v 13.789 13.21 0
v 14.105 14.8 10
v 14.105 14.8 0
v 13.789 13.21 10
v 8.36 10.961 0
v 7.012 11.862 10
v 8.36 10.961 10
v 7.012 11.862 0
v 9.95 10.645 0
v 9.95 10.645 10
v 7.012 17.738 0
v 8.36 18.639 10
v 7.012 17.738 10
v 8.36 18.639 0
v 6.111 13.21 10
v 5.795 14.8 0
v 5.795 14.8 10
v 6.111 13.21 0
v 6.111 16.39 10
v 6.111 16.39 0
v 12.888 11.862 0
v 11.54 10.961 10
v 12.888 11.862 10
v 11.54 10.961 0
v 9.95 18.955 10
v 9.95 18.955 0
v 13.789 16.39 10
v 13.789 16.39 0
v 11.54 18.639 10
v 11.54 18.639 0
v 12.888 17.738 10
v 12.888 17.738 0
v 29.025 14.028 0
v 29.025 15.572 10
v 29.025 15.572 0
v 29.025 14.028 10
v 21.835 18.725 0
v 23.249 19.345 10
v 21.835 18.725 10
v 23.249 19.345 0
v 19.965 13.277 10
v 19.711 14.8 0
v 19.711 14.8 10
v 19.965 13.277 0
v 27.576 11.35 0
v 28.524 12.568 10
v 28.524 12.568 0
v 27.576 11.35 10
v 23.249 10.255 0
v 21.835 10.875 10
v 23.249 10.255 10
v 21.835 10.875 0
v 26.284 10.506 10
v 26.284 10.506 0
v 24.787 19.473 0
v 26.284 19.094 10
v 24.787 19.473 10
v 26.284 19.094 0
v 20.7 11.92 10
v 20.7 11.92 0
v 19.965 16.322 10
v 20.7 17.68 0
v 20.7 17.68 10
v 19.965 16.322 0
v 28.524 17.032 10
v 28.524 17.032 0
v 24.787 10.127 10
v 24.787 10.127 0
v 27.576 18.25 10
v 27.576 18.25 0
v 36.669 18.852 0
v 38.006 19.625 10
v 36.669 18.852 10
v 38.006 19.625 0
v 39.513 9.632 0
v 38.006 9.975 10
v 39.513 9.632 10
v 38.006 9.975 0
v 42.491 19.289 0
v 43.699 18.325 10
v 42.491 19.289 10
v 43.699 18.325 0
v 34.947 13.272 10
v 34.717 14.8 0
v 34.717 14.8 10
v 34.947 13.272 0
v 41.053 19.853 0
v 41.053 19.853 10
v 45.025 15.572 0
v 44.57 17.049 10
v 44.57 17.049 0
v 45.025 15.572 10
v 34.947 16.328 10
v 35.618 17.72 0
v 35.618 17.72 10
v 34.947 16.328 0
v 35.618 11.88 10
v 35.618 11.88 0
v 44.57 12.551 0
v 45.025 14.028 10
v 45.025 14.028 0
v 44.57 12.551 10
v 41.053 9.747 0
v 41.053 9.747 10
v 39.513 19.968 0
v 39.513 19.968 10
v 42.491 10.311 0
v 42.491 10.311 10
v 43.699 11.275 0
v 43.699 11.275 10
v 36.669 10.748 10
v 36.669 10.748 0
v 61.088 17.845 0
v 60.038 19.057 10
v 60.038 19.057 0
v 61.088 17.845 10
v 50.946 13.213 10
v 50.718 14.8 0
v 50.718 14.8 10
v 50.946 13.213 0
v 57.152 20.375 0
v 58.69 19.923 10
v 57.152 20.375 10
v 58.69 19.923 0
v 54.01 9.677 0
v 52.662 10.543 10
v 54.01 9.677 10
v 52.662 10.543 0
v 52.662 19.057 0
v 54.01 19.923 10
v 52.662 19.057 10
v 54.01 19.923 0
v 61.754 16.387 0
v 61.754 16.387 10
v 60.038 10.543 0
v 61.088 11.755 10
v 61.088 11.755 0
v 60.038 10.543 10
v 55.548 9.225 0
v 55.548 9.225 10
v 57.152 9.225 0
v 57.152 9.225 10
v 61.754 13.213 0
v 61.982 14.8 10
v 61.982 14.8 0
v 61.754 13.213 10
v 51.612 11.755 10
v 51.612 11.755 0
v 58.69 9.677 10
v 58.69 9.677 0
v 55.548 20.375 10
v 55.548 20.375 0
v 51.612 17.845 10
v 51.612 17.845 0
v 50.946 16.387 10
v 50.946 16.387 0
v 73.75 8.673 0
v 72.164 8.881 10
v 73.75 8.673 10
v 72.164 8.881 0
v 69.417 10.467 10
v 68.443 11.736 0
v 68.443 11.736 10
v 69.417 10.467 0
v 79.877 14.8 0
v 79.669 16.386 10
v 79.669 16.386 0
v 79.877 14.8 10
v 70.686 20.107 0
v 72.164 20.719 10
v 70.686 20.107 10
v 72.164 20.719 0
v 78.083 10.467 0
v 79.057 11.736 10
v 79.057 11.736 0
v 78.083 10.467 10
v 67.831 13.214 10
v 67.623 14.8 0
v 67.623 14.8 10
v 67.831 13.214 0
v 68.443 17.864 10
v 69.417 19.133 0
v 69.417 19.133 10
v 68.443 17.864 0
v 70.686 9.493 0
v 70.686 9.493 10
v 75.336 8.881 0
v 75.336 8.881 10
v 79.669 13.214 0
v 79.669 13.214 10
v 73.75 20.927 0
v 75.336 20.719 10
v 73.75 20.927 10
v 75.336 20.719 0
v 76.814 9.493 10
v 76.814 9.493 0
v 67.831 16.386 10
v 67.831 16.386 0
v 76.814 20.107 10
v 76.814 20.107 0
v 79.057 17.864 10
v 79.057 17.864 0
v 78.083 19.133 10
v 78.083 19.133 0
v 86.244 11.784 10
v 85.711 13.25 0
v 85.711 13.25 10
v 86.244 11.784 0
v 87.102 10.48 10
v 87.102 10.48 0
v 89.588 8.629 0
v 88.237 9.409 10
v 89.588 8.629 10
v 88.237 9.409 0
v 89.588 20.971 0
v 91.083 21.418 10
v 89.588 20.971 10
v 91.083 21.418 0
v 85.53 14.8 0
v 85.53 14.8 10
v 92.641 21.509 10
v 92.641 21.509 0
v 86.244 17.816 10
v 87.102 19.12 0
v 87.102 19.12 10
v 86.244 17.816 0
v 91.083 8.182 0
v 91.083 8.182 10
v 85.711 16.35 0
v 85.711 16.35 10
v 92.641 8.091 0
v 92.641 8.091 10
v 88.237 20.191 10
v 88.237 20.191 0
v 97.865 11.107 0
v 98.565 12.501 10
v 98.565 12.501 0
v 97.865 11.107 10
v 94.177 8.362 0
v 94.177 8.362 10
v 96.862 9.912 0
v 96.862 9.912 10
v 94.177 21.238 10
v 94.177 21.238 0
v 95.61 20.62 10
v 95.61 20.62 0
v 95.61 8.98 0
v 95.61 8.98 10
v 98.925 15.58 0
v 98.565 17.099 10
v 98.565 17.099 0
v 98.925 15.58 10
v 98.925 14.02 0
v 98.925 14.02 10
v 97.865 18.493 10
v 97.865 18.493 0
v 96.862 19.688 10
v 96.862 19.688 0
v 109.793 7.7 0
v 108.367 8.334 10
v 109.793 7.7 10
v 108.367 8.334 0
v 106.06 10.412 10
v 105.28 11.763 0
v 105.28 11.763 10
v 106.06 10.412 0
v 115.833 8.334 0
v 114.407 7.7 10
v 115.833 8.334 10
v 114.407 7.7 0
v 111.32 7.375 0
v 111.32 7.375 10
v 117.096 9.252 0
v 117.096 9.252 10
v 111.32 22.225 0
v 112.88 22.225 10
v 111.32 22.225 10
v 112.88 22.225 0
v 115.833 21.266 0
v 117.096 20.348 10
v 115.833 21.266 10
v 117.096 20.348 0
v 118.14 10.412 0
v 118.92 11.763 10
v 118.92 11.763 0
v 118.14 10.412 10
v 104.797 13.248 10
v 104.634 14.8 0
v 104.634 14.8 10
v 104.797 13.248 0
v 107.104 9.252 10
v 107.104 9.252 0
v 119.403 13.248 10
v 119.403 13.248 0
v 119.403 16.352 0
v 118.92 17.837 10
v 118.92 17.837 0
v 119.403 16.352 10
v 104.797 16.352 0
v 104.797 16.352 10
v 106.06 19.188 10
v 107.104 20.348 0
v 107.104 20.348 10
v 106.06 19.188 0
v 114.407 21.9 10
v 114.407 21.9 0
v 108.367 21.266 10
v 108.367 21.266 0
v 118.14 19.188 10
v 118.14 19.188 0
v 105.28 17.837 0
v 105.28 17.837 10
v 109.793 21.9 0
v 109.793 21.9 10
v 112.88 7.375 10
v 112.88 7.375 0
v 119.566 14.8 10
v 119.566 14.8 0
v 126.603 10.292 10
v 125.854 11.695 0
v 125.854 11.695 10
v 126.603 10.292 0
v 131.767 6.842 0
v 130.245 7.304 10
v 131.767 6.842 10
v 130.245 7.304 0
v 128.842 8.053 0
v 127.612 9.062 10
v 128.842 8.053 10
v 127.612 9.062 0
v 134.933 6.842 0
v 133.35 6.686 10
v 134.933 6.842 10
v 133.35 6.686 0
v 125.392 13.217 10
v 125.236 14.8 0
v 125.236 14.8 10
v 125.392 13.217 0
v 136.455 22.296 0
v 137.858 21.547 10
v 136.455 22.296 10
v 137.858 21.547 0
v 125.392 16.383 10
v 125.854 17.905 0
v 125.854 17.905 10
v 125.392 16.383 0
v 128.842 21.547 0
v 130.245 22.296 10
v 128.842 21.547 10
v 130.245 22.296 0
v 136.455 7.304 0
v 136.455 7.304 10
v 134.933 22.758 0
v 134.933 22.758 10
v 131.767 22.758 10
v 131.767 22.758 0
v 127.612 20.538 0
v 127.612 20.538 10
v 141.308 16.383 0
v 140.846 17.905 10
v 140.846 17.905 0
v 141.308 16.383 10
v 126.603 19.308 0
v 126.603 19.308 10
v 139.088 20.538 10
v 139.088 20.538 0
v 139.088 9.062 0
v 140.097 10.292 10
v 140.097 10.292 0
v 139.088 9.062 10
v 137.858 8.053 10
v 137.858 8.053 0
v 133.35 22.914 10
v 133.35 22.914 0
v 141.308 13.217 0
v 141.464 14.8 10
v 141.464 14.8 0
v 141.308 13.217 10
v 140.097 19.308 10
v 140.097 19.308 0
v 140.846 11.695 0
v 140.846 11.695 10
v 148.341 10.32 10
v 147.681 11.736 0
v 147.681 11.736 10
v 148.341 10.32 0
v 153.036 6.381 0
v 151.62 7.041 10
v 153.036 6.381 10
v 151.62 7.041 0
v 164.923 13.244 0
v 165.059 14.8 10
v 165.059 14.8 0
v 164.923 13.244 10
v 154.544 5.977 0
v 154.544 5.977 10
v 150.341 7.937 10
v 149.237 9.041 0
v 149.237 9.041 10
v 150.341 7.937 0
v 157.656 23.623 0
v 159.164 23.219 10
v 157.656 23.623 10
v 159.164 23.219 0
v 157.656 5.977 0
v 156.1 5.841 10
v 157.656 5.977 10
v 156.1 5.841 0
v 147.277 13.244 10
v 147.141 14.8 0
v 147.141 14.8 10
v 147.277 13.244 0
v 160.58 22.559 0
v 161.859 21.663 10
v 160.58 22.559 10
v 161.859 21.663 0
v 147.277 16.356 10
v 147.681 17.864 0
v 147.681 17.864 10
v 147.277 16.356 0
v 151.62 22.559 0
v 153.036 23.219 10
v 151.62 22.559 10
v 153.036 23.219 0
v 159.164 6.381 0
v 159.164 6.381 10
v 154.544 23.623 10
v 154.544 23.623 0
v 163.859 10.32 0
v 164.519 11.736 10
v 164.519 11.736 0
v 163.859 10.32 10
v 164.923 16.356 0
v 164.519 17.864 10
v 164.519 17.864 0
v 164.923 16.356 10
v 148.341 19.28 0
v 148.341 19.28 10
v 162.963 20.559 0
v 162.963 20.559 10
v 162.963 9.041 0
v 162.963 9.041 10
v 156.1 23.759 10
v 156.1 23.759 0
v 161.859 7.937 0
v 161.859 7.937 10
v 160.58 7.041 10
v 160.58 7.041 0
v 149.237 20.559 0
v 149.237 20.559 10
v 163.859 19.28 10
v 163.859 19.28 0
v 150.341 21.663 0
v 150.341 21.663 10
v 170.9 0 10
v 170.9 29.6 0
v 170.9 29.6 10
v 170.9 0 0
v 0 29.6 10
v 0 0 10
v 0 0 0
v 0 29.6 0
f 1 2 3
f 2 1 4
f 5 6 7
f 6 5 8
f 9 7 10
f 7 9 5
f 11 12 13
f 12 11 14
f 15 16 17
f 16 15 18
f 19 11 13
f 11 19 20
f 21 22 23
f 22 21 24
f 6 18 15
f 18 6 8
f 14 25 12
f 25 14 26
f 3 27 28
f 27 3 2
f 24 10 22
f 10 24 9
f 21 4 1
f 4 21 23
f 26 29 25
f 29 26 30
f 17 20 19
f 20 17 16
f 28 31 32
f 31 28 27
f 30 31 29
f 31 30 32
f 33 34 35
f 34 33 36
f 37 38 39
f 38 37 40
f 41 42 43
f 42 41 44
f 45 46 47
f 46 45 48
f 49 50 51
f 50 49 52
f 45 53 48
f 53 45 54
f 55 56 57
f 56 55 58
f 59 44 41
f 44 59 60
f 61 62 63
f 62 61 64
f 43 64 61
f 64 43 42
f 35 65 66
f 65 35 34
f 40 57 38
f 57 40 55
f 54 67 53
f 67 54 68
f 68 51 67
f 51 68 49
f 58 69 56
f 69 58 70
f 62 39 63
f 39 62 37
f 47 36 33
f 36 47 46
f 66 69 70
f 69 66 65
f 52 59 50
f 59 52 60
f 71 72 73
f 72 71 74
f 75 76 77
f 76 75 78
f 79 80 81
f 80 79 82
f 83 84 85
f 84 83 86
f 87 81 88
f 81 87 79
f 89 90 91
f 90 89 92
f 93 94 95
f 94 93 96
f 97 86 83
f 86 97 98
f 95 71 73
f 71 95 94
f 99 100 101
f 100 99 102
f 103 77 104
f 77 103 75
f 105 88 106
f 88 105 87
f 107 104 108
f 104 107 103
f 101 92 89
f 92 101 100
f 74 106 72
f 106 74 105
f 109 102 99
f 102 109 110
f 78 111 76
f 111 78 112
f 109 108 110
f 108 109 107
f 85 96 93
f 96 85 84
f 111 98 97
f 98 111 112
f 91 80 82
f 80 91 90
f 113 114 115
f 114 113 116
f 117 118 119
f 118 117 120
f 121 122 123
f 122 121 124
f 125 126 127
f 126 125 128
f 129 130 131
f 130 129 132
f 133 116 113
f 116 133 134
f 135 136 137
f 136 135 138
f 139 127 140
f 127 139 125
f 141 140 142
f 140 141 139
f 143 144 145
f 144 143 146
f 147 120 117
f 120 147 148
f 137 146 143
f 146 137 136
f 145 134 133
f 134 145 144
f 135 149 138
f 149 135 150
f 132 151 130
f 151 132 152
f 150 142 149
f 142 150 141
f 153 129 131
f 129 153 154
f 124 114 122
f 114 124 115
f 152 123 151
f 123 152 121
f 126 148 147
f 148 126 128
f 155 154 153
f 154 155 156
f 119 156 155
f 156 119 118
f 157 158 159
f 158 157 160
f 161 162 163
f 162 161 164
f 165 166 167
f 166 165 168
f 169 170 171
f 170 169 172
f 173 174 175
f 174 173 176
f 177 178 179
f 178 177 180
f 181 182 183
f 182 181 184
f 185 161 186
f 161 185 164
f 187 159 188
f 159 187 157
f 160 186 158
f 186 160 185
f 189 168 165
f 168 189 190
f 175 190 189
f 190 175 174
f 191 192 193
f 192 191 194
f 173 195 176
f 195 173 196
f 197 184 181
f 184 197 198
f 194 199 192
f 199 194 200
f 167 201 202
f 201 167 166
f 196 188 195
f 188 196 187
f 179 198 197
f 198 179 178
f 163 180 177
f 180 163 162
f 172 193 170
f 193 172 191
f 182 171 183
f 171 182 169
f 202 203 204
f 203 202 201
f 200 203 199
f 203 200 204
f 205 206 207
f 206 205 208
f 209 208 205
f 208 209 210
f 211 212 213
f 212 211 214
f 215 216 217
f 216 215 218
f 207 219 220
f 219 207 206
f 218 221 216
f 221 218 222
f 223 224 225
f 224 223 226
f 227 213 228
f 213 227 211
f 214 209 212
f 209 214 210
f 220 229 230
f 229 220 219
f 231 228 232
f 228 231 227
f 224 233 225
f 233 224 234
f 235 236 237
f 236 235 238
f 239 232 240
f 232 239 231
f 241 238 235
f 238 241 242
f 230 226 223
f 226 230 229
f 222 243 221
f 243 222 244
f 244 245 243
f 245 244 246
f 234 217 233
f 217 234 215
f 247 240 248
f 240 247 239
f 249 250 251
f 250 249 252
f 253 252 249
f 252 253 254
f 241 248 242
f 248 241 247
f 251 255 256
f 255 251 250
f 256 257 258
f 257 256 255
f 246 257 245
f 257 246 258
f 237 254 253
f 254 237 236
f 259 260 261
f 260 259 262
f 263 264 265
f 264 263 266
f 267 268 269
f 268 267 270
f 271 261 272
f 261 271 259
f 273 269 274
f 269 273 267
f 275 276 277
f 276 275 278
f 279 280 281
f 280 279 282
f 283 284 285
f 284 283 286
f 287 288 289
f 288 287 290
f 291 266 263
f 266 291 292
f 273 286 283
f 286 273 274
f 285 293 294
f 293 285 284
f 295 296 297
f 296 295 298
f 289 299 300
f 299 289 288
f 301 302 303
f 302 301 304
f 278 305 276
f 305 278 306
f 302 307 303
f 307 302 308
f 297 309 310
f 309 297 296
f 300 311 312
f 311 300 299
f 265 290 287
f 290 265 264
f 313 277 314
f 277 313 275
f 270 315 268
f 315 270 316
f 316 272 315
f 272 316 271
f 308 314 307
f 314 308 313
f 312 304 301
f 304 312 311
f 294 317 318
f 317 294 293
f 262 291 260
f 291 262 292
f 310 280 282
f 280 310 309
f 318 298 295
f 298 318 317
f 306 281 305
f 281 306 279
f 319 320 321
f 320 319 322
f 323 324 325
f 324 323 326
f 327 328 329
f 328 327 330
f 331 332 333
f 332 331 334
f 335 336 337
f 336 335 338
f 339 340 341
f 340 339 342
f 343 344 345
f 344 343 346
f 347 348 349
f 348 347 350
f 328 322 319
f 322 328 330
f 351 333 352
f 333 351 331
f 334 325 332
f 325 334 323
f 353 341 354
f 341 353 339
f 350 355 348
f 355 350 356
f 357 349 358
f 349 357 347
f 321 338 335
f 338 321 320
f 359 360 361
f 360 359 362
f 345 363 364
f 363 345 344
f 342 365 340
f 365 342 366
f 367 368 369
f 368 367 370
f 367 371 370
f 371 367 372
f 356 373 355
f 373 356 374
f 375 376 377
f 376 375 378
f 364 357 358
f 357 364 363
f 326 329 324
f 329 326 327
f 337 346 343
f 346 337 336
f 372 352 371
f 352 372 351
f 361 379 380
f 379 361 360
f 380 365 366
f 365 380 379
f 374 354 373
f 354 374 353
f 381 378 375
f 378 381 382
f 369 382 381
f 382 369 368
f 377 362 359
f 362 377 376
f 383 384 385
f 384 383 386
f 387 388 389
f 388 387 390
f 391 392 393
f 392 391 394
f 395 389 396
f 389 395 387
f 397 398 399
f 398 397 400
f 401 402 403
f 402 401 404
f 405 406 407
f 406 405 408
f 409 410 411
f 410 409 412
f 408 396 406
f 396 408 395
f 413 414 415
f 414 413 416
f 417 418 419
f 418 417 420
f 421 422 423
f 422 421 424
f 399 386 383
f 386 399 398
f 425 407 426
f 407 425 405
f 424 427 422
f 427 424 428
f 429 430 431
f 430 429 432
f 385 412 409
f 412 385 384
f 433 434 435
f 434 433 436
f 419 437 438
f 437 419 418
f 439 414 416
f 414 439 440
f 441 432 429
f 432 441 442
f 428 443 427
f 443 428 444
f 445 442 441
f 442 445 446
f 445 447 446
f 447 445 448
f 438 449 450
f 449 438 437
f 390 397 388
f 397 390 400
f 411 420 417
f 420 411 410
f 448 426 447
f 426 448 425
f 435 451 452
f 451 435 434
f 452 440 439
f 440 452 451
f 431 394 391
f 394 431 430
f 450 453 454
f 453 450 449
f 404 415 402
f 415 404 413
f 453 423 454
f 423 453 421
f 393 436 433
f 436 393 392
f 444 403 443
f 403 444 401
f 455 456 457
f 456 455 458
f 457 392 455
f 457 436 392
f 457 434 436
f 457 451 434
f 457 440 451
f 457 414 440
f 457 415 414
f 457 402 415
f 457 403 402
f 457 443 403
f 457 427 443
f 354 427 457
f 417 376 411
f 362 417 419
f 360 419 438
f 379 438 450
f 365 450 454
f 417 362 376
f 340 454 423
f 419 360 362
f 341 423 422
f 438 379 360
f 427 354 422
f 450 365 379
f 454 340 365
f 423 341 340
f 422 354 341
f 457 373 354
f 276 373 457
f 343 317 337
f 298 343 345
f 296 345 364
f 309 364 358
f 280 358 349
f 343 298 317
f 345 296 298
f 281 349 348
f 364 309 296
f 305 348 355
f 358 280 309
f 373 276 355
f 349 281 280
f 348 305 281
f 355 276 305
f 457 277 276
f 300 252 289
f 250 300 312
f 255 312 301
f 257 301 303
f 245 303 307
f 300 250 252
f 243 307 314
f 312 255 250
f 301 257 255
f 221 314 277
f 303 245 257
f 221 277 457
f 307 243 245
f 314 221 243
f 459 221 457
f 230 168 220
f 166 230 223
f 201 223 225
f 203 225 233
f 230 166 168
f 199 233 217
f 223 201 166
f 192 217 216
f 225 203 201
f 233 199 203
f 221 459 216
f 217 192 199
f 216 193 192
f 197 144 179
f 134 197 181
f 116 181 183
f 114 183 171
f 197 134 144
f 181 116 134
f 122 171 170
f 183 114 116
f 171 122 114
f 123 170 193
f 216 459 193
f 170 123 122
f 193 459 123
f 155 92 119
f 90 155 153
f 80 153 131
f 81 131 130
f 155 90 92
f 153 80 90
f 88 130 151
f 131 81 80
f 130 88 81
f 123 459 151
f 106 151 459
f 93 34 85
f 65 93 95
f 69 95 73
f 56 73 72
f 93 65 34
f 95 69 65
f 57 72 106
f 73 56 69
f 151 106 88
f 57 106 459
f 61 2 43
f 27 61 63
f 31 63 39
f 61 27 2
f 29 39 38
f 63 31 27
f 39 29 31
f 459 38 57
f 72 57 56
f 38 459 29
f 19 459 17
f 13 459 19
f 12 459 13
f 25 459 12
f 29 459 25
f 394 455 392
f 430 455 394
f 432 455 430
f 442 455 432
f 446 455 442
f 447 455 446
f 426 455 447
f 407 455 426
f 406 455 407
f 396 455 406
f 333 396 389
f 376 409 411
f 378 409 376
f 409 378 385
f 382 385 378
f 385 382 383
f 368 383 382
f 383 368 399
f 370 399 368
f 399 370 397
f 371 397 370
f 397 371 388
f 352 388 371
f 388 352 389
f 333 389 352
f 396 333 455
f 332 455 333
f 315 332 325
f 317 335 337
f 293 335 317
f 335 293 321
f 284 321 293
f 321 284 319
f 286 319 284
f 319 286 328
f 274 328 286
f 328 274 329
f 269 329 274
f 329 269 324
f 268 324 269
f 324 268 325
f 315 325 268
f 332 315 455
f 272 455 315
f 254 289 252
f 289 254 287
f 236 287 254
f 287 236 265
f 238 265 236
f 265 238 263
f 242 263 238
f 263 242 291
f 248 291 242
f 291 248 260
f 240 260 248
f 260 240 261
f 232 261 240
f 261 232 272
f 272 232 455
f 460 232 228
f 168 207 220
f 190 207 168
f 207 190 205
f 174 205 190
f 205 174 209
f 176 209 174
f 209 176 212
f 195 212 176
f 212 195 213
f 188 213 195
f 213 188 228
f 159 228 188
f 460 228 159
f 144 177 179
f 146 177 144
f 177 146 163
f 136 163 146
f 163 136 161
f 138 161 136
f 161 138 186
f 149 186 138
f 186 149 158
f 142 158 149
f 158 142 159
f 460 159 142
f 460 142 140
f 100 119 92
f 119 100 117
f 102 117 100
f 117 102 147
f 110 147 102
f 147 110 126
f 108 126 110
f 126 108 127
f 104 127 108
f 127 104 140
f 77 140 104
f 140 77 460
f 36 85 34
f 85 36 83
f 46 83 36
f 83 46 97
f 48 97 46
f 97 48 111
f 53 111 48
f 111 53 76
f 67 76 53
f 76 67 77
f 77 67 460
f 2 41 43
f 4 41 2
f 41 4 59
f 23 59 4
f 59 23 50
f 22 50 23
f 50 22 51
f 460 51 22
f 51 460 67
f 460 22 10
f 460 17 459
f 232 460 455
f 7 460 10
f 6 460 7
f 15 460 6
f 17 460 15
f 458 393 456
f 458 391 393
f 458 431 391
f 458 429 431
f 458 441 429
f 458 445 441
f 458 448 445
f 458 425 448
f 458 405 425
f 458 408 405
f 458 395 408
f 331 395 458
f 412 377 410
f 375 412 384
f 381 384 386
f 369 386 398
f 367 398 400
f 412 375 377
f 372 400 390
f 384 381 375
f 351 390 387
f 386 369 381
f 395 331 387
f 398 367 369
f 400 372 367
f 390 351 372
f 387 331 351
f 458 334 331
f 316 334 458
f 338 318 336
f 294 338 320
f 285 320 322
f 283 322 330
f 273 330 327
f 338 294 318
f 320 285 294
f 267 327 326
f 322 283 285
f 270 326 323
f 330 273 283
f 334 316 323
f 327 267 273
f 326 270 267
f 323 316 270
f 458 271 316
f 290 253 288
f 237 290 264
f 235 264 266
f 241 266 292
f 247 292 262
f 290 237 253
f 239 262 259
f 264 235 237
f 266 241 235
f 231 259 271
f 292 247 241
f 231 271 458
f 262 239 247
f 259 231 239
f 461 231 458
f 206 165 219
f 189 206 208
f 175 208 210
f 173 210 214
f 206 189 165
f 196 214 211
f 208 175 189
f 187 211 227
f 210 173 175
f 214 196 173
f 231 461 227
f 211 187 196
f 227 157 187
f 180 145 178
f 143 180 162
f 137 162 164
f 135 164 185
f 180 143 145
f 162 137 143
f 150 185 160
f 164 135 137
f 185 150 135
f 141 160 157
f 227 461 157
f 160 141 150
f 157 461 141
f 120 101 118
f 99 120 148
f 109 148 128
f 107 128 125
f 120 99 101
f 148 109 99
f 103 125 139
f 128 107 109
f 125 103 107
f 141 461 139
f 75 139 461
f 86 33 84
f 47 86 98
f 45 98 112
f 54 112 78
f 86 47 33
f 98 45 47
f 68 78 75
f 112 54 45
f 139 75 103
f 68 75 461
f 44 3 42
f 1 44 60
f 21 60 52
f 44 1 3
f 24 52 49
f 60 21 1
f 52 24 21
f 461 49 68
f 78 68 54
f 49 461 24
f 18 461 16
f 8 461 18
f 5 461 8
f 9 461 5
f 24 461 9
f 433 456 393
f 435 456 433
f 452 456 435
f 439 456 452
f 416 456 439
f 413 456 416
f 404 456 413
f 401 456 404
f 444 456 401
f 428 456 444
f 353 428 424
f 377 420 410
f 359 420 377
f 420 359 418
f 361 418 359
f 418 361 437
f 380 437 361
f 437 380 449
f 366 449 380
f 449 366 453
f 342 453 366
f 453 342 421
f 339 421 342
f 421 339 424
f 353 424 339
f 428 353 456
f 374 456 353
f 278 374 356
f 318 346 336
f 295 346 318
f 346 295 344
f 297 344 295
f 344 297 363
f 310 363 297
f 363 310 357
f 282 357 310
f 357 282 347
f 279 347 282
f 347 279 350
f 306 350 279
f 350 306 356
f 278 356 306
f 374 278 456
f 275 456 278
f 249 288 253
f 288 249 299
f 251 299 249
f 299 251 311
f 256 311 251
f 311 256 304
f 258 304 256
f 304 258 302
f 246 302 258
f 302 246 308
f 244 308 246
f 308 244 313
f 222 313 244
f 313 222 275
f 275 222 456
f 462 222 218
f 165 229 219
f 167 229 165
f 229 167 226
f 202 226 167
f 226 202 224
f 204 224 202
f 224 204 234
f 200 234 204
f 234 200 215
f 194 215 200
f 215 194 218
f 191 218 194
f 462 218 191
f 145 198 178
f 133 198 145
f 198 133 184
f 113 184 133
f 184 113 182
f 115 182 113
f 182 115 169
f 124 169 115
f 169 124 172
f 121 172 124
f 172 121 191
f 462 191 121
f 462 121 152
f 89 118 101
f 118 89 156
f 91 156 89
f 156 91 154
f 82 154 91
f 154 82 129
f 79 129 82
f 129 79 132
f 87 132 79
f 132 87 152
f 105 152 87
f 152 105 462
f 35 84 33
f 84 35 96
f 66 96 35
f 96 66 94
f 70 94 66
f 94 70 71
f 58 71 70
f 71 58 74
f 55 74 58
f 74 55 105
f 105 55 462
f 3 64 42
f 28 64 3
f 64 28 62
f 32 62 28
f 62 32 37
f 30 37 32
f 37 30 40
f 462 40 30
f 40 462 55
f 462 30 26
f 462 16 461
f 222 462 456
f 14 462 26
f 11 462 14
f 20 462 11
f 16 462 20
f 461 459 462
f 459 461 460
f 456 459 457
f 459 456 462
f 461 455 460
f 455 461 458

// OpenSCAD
// A list of hole sizes (mm)
holes = [7.9,9.0,10.0,10.9,11.9,13.1,14.6,15.9,17.6];

// Diameter adjustment for your printer (mm)
offset = 0.25;

// The distance between holes, edges (mm)
spacing = 6;

// The overall depth of the part (mm)
thickness = 10;

function add(v, i = 0, r = 0) = i < len(v) ? add(v, i + 1, r + v[i]) : r;

module polyhole(h, d) {
    n = max(round(2 * d),3);
    rotate([0,0,180]) {
        radius = (d / 2) / cos(180 / n);
        cylinder(h = h, r = radius, $fn = n);
        echo(d, radius, n);
    }
}

difference() {
    cube(size = [add(holes) + spacing * (len(holes) + 1), max(holes) + spacing * 2, thickness]);
    union() {
        for(i = [0:len(holes) - 1]) {
            xloc = [ for(n = [0:i]) holes[n] ];
            translate([add(xloc) + spacing * (i + 1) - holes[i] / 2, max(holes) / 2 + spacing, -1]) {
                polyhole(h = thickness + 2, d = holes[i] + offset);
            }
        }
    }
}
